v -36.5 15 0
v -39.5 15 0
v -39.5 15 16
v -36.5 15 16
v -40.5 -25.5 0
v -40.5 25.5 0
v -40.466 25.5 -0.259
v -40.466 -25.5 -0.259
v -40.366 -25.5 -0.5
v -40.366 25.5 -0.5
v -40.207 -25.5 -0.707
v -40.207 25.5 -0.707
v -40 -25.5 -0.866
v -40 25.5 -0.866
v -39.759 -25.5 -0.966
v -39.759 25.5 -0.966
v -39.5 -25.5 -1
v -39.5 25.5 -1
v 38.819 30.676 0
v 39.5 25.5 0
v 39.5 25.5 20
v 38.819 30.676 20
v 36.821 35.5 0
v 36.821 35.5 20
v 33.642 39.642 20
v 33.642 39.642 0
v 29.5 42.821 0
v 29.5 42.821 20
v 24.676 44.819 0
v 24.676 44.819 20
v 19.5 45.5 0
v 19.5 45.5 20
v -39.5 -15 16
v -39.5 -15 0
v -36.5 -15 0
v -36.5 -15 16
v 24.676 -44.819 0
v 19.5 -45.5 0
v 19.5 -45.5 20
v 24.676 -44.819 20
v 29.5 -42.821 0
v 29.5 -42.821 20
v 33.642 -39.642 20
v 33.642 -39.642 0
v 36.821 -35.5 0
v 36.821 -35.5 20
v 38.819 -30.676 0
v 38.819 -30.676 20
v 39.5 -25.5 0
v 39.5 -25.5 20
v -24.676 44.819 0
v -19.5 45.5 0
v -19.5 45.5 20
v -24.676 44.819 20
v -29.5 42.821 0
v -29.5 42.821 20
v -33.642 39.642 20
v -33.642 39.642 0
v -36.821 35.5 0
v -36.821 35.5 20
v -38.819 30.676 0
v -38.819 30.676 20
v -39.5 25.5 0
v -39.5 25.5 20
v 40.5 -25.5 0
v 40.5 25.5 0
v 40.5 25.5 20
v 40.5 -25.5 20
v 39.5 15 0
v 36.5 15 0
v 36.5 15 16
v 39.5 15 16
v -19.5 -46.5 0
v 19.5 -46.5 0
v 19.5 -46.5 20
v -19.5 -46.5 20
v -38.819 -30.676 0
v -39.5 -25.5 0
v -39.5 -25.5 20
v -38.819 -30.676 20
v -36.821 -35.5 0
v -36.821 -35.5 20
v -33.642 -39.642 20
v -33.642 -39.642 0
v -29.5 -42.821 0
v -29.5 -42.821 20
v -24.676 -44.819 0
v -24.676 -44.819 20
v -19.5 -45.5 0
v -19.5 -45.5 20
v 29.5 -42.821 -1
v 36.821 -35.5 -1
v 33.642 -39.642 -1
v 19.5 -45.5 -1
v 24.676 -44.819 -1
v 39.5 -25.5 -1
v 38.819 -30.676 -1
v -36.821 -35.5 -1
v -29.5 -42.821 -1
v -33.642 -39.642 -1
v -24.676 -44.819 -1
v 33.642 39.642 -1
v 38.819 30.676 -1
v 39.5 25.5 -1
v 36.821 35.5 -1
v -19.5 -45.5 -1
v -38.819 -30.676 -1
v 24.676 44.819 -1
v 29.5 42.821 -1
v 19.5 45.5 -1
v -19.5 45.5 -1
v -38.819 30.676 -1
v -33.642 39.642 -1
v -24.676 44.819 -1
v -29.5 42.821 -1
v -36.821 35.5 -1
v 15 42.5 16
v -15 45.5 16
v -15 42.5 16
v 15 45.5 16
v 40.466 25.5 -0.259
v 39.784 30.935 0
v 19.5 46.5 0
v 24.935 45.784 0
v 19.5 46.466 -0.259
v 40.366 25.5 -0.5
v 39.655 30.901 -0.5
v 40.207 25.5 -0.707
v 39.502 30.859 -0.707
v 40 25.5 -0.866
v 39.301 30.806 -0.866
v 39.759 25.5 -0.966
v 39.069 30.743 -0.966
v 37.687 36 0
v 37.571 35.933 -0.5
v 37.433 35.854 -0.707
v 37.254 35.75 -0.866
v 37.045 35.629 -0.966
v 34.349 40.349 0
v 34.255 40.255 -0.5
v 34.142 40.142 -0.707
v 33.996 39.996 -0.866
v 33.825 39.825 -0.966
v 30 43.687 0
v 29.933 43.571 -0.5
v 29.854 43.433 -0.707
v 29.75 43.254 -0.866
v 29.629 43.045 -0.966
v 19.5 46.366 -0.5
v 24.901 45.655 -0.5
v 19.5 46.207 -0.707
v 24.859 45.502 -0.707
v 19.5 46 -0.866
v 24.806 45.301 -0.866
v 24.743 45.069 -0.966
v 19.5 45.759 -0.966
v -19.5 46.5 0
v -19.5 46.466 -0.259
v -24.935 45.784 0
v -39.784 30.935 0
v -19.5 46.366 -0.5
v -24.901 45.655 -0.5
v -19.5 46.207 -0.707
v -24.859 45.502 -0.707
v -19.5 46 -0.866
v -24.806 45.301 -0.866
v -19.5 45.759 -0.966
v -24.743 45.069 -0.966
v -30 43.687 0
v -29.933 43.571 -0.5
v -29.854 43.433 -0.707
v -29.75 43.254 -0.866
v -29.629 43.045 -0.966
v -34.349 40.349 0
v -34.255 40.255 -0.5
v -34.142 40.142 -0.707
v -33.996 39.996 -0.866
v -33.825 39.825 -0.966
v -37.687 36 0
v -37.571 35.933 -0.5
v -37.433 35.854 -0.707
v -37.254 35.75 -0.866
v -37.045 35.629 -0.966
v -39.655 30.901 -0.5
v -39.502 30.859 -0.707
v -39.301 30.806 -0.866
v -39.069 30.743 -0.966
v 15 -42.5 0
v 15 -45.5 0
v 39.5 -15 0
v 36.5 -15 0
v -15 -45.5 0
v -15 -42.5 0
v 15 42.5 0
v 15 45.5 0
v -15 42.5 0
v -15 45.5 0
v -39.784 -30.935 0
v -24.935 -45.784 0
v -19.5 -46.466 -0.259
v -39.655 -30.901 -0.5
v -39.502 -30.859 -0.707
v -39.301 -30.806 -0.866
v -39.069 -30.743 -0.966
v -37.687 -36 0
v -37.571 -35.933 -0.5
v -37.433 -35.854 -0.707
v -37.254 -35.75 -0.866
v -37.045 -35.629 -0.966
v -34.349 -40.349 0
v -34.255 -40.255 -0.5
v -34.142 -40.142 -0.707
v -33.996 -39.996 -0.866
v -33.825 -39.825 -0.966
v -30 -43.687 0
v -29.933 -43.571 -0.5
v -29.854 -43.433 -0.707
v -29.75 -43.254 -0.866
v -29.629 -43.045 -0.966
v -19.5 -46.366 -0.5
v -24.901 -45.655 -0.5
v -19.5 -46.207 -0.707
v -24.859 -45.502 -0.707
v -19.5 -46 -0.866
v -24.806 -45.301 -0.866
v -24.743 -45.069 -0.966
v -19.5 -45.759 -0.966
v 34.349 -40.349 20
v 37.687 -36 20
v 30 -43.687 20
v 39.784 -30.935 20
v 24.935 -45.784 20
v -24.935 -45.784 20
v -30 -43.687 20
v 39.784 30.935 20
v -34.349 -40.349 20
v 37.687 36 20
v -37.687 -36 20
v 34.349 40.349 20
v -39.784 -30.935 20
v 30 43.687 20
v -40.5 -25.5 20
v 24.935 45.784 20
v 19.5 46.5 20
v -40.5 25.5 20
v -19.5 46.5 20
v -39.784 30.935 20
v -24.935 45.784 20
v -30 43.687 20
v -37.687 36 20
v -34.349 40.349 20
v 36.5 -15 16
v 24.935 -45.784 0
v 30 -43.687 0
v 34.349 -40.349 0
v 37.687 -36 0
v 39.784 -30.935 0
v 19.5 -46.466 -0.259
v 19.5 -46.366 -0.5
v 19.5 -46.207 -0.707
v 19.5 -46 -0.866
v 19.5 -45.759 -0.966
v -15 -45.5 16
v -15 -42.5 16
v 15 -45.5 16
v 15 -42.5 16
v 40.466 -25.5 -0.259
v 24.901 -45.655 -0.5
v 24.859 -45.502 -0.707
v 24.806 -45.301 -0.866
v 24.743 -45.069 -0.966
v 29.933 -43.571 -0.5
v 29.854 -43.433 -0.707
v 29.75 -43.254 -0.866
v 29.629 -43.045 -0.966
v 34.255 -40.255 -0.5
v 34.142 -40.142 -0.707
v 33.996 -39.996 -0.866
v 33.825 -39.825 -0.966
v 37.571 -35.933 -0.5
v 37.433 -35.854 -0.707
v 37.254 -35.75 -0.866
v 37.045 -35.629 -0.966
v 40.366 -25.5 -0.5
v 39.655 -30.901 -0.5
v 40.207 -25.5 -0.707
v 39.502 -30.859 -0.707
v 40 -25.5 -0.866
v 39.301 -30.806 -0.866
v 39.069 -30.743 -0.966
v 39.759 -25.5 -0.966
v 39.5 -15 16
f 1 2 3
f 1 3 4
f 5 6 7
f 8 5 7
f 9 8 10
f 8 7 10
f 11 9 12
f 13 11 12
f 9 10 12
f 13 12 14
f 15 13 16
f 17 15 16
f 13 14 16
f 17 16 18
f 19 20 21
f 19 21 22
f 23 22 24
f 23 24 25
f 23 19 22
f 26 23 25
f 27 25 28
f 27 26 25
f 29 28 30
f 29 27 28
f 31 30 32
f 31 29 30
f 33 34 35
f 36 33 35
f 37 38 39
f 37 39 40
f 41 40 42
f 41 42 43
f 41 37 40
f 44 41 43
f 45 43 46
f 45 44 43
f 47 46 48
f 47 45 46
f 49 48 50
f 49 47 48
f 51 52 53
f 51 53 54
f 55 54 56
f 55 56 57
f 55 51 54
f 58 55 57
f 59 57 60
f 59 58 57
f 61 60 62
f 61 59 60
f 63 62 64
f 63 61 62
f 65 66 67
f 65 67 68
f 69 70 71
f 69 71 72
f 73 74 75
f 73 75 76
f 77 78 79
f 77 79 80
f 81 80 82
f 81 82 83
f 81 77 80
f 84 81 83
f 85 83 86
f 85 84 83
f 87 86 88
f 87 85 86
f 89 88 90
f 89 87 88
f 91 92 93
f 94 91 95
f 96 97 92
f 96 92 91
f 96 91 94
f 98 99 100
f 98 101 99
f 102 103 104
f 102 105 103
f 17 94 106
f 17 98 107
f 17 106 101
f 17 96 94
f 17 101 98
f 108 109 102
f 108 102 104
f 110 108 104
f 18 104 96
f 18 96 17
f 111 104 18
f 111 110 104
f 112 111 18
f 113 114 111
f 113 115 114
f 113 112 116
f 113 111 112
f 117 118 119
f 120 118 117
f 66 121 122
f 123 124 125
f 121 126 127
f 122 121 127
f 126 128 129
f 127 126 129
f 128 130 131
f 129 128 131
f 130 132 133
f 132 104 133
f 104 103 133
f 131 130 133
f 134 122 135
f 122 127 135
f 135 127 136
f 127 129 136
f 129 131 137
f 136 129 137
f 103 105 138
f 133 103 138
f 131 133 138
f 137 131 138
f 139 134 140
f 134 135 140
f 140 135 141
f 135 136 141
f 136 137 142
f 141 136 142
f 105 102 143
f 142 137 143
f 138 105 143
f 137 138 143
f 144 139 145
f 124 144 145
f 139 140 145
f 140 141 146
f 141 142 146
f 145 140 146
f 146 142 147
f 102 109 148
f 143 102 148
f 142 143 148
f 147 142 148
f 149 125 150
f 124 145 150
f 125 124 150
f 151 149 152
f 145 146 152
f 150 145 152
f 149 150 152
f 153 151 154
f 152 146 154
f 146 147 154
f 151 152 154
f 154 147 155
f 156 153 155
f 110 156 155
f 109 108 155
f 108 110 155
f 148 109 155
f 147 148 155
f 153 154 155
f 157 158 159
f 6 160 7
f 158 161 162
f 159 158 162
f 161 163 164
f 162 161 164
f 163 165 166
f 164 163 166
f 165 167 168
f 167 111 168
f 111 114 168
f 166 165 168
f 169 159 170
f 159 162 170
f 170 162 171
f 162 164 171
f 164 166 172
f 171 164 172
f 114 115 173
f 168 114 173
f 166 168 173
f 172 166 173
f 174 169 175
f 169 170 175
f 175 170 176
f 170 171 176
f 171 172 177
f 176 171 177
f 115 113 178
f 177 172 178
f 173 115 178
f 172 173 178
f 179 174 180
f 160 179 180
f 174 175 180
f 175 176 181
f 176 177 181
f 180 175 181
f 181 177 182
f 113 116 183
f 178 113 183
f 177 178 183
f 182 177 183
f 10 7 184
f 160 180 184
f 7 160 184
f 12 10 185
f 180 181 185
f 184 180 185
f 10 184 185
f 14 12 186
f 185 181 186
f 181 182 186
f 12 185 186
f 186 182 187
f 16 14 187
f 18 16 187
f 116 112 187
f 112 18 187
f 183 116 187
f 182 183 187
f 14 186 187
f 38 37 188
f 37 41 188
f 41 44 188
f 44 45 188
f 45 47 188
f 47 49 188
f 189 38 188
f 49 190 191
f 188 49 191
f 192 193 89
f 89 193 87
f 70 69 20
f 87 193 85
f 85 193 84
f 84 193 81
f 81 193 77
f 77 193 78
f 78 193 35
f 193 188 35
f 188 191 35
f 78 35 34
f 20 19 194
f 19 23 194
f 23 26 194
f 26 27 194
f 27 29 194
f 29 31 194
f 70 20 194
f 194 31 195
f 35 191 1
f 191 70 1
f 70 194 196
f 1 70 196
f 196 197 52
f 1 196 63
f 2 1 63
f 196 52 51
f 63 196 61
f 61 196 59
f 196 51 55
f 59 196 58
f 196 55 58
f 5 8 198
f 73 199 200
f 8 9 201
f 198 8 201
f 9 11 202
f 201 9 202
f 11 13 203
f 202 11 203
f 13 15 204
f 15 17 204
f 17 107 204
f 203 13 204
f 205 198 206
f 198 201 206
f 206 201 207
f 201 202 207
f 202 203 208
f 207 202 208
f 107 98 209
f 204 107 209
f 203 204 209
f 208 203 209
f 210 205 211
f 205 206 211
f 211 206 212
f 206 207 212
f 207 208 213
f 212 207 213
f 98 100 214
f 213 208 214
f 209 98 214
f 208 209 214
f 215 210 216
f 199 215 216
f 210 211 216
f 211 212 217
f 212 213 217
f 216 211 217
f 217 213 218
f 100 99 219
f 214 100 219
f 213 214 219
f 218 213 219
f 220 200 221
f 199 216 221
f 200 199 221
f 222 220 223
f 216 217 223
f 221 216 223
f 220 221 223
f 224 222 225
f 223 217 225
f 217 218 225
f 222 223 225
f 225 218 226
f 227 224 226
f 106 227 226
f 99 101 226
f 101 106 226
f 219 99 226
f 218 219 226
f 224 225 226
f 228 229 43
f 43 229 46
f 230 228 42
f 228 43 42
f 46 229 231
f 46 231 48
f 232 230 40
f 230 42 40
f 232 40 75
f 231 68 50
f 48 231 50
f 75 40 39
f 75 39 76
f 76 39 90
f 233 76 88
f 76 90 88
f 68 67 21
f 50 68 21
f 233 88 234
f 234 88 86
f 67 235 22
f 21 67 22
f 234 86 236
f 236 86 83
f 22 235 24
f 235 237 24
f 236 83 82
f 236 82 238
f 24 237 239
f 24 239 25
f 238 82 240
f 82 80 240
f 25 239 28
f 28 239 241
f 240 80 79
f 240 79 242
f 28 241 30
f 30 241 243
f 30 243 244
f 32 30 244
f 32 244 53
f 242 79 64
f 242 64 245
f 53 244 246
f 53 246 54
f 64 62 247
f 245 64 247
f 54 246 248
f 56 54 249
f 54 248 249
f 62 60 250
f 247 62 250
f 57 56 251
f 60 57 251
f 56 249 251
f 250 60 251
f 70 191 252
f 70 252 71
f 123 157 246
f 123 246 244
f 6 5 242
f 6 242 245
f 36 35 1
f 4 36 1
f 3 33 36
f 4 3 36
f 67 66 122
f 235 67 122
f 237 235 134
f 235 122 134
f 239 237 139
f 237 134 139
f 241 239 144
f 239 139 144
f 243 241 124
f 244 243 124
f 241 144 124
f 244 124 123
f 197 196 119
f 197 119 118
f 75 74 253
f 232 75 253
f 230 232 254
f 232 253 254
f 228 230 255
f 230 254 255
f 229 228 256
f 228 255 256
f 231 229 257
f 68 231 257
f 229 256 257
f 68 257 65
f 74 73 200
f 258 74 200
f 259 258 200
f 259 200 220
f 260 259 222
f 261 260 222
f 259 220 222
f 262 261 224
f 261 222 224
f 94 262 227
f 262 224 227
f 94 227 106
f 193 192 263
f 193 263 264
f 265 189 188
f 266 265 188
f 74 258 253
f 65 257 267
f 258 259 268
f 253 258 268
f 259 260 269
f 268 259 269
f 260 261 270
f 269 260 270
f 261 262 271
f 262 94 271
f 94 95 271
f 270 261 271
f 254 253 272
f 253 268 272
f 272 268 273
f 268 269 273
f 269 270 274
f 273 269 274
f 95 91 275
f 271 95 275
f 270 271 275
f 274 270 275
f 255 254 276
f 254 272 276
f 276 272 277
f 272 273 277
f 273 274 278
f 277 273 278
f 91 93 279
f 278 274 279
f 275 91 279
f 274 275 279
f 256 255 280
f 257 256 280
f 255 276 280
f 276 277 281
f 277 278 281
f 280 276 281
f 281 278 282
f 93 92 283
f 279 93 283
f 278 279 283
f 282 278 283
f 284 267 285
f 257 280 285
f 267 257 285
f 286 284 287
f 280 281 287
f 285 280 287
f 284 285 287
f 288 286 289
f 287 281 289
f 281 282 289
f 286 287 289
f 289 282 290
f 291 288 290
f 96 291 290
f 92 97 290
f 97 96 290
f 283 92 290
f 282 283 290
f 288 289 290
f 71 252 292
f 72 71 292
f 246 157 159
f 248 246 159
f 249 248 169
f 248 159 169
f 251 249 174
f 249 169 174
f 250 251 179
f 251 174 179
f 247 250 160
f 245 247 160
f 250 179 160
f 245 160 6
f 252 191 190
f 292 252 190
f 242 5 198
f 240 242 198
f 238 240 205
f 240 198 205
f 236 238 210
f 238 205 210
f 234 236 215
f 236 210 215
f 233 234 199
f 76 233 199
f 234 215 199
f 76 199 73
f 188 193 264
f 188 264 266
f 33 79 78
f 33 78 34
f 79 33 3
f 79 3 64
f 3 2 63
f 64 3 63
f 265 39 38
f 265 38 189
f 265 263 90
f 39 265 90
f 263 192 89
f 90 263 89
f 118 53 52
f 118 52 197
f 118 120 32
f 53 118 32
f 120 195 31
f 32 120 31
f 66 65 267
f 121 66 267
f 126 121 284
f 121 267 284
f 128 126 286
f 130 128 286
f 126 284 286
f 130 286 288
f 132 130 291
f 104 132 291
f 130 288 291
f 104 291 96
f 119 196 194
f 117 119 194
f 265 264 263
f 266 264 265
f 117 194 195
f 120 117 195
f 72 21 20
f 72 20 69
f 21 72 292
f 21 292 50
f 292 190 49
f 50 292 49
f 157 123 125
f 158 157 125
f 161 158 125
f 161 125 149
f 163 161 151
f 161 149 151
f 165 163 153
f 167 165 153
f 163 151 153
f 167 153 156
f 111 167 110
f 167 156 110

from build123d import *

# Parameters (mm, degrees)
PAD_DEPTH     = 20
THICKNESS_T   = 1
SKETCH001_W   = 3
SKETCH001_H   = 30
SKETCH001_W_2 = 30
SKETCH001_H_2 = 3
PAD001_DEPTH  = 16
PAD002_DEPTH  = 16


with BuildPart() as part:
    # Sketch → Pad (new body)
    with BuildSketch(Plane.XY):
        with BuildLine():
            Line((-19.5, 45.5), (19.5, 45.5))
            ThreePointArc((39.5, 25.5), (33.642136, 39.642136), (19.5, 45.5))
            Line((39.5, 25.5), (39.5, -25.5))
            ThreePointArc((19.5, -45.5), (33.642136, -39.642136), (39.5, -25.5))
            Line((19.5, -45.5), (-19.5, -45.5))
            ThreePointArc((-39.5, -25.5), (-33.642136, -39.642136), (-19.5, -45.5))
            Line((-39.5, -25.5), (-39.5, 25.5))
            ThreePointArc((-19.5, 45.5), (-33.642136, 39.642136), (-39.5, 25.5))
        make_face()
    extrude(amount=PAD_DEPTH)

    # Thickness
    thickness_openings = [part.faces().sort_by_distance(p)[0] for p in [
        (0, 0, 20),
    ]]
    offset(amount=THICKNESS_T, openings=thickness_openings)

    # Sketch001 (on Face9 of Thickness) → Pad001 (join)
    with BuildSketch(Plane.XY):
        with Locations((-38, 0)):
            Rectangle(SKETCH001_W, SKETCH001_H)
        with Locations((38, 0)):
            Rectangle(SKETCH001_W, SKETCH001_H)
        with Locations((0, -44)):
            Rectangle(SKETCH001_W_2, SKETCH001_H_2)
        with Locations((0, 44)):
            Rectangle(SKETCH001_W_2, SKETCH001_H_2)
    extrude(amount=PAD001_DEPTH)

    # Sketch001 (on Face9 of Thickness) → Pad002 (join)
    with BuildSketch(Plane.XY):
        with Locations((-38, 0)):
            Rectangle(SKETCH001_W, SKETCH001_H)
        with Locations((38, 0)):
            Rectangle(SKETCH001_W, SKETCH001_H)
        with Locations((0, -44)):
            Rectangle(SKETCH001_W_2, SKETCH001_H_2)
        with Locations((0, 44)):
            Rectangle(SKETCH001_W_2, SKETCH001_H_2)
    extrude(amount=PAD002_DEPTH)


solid = part.part
